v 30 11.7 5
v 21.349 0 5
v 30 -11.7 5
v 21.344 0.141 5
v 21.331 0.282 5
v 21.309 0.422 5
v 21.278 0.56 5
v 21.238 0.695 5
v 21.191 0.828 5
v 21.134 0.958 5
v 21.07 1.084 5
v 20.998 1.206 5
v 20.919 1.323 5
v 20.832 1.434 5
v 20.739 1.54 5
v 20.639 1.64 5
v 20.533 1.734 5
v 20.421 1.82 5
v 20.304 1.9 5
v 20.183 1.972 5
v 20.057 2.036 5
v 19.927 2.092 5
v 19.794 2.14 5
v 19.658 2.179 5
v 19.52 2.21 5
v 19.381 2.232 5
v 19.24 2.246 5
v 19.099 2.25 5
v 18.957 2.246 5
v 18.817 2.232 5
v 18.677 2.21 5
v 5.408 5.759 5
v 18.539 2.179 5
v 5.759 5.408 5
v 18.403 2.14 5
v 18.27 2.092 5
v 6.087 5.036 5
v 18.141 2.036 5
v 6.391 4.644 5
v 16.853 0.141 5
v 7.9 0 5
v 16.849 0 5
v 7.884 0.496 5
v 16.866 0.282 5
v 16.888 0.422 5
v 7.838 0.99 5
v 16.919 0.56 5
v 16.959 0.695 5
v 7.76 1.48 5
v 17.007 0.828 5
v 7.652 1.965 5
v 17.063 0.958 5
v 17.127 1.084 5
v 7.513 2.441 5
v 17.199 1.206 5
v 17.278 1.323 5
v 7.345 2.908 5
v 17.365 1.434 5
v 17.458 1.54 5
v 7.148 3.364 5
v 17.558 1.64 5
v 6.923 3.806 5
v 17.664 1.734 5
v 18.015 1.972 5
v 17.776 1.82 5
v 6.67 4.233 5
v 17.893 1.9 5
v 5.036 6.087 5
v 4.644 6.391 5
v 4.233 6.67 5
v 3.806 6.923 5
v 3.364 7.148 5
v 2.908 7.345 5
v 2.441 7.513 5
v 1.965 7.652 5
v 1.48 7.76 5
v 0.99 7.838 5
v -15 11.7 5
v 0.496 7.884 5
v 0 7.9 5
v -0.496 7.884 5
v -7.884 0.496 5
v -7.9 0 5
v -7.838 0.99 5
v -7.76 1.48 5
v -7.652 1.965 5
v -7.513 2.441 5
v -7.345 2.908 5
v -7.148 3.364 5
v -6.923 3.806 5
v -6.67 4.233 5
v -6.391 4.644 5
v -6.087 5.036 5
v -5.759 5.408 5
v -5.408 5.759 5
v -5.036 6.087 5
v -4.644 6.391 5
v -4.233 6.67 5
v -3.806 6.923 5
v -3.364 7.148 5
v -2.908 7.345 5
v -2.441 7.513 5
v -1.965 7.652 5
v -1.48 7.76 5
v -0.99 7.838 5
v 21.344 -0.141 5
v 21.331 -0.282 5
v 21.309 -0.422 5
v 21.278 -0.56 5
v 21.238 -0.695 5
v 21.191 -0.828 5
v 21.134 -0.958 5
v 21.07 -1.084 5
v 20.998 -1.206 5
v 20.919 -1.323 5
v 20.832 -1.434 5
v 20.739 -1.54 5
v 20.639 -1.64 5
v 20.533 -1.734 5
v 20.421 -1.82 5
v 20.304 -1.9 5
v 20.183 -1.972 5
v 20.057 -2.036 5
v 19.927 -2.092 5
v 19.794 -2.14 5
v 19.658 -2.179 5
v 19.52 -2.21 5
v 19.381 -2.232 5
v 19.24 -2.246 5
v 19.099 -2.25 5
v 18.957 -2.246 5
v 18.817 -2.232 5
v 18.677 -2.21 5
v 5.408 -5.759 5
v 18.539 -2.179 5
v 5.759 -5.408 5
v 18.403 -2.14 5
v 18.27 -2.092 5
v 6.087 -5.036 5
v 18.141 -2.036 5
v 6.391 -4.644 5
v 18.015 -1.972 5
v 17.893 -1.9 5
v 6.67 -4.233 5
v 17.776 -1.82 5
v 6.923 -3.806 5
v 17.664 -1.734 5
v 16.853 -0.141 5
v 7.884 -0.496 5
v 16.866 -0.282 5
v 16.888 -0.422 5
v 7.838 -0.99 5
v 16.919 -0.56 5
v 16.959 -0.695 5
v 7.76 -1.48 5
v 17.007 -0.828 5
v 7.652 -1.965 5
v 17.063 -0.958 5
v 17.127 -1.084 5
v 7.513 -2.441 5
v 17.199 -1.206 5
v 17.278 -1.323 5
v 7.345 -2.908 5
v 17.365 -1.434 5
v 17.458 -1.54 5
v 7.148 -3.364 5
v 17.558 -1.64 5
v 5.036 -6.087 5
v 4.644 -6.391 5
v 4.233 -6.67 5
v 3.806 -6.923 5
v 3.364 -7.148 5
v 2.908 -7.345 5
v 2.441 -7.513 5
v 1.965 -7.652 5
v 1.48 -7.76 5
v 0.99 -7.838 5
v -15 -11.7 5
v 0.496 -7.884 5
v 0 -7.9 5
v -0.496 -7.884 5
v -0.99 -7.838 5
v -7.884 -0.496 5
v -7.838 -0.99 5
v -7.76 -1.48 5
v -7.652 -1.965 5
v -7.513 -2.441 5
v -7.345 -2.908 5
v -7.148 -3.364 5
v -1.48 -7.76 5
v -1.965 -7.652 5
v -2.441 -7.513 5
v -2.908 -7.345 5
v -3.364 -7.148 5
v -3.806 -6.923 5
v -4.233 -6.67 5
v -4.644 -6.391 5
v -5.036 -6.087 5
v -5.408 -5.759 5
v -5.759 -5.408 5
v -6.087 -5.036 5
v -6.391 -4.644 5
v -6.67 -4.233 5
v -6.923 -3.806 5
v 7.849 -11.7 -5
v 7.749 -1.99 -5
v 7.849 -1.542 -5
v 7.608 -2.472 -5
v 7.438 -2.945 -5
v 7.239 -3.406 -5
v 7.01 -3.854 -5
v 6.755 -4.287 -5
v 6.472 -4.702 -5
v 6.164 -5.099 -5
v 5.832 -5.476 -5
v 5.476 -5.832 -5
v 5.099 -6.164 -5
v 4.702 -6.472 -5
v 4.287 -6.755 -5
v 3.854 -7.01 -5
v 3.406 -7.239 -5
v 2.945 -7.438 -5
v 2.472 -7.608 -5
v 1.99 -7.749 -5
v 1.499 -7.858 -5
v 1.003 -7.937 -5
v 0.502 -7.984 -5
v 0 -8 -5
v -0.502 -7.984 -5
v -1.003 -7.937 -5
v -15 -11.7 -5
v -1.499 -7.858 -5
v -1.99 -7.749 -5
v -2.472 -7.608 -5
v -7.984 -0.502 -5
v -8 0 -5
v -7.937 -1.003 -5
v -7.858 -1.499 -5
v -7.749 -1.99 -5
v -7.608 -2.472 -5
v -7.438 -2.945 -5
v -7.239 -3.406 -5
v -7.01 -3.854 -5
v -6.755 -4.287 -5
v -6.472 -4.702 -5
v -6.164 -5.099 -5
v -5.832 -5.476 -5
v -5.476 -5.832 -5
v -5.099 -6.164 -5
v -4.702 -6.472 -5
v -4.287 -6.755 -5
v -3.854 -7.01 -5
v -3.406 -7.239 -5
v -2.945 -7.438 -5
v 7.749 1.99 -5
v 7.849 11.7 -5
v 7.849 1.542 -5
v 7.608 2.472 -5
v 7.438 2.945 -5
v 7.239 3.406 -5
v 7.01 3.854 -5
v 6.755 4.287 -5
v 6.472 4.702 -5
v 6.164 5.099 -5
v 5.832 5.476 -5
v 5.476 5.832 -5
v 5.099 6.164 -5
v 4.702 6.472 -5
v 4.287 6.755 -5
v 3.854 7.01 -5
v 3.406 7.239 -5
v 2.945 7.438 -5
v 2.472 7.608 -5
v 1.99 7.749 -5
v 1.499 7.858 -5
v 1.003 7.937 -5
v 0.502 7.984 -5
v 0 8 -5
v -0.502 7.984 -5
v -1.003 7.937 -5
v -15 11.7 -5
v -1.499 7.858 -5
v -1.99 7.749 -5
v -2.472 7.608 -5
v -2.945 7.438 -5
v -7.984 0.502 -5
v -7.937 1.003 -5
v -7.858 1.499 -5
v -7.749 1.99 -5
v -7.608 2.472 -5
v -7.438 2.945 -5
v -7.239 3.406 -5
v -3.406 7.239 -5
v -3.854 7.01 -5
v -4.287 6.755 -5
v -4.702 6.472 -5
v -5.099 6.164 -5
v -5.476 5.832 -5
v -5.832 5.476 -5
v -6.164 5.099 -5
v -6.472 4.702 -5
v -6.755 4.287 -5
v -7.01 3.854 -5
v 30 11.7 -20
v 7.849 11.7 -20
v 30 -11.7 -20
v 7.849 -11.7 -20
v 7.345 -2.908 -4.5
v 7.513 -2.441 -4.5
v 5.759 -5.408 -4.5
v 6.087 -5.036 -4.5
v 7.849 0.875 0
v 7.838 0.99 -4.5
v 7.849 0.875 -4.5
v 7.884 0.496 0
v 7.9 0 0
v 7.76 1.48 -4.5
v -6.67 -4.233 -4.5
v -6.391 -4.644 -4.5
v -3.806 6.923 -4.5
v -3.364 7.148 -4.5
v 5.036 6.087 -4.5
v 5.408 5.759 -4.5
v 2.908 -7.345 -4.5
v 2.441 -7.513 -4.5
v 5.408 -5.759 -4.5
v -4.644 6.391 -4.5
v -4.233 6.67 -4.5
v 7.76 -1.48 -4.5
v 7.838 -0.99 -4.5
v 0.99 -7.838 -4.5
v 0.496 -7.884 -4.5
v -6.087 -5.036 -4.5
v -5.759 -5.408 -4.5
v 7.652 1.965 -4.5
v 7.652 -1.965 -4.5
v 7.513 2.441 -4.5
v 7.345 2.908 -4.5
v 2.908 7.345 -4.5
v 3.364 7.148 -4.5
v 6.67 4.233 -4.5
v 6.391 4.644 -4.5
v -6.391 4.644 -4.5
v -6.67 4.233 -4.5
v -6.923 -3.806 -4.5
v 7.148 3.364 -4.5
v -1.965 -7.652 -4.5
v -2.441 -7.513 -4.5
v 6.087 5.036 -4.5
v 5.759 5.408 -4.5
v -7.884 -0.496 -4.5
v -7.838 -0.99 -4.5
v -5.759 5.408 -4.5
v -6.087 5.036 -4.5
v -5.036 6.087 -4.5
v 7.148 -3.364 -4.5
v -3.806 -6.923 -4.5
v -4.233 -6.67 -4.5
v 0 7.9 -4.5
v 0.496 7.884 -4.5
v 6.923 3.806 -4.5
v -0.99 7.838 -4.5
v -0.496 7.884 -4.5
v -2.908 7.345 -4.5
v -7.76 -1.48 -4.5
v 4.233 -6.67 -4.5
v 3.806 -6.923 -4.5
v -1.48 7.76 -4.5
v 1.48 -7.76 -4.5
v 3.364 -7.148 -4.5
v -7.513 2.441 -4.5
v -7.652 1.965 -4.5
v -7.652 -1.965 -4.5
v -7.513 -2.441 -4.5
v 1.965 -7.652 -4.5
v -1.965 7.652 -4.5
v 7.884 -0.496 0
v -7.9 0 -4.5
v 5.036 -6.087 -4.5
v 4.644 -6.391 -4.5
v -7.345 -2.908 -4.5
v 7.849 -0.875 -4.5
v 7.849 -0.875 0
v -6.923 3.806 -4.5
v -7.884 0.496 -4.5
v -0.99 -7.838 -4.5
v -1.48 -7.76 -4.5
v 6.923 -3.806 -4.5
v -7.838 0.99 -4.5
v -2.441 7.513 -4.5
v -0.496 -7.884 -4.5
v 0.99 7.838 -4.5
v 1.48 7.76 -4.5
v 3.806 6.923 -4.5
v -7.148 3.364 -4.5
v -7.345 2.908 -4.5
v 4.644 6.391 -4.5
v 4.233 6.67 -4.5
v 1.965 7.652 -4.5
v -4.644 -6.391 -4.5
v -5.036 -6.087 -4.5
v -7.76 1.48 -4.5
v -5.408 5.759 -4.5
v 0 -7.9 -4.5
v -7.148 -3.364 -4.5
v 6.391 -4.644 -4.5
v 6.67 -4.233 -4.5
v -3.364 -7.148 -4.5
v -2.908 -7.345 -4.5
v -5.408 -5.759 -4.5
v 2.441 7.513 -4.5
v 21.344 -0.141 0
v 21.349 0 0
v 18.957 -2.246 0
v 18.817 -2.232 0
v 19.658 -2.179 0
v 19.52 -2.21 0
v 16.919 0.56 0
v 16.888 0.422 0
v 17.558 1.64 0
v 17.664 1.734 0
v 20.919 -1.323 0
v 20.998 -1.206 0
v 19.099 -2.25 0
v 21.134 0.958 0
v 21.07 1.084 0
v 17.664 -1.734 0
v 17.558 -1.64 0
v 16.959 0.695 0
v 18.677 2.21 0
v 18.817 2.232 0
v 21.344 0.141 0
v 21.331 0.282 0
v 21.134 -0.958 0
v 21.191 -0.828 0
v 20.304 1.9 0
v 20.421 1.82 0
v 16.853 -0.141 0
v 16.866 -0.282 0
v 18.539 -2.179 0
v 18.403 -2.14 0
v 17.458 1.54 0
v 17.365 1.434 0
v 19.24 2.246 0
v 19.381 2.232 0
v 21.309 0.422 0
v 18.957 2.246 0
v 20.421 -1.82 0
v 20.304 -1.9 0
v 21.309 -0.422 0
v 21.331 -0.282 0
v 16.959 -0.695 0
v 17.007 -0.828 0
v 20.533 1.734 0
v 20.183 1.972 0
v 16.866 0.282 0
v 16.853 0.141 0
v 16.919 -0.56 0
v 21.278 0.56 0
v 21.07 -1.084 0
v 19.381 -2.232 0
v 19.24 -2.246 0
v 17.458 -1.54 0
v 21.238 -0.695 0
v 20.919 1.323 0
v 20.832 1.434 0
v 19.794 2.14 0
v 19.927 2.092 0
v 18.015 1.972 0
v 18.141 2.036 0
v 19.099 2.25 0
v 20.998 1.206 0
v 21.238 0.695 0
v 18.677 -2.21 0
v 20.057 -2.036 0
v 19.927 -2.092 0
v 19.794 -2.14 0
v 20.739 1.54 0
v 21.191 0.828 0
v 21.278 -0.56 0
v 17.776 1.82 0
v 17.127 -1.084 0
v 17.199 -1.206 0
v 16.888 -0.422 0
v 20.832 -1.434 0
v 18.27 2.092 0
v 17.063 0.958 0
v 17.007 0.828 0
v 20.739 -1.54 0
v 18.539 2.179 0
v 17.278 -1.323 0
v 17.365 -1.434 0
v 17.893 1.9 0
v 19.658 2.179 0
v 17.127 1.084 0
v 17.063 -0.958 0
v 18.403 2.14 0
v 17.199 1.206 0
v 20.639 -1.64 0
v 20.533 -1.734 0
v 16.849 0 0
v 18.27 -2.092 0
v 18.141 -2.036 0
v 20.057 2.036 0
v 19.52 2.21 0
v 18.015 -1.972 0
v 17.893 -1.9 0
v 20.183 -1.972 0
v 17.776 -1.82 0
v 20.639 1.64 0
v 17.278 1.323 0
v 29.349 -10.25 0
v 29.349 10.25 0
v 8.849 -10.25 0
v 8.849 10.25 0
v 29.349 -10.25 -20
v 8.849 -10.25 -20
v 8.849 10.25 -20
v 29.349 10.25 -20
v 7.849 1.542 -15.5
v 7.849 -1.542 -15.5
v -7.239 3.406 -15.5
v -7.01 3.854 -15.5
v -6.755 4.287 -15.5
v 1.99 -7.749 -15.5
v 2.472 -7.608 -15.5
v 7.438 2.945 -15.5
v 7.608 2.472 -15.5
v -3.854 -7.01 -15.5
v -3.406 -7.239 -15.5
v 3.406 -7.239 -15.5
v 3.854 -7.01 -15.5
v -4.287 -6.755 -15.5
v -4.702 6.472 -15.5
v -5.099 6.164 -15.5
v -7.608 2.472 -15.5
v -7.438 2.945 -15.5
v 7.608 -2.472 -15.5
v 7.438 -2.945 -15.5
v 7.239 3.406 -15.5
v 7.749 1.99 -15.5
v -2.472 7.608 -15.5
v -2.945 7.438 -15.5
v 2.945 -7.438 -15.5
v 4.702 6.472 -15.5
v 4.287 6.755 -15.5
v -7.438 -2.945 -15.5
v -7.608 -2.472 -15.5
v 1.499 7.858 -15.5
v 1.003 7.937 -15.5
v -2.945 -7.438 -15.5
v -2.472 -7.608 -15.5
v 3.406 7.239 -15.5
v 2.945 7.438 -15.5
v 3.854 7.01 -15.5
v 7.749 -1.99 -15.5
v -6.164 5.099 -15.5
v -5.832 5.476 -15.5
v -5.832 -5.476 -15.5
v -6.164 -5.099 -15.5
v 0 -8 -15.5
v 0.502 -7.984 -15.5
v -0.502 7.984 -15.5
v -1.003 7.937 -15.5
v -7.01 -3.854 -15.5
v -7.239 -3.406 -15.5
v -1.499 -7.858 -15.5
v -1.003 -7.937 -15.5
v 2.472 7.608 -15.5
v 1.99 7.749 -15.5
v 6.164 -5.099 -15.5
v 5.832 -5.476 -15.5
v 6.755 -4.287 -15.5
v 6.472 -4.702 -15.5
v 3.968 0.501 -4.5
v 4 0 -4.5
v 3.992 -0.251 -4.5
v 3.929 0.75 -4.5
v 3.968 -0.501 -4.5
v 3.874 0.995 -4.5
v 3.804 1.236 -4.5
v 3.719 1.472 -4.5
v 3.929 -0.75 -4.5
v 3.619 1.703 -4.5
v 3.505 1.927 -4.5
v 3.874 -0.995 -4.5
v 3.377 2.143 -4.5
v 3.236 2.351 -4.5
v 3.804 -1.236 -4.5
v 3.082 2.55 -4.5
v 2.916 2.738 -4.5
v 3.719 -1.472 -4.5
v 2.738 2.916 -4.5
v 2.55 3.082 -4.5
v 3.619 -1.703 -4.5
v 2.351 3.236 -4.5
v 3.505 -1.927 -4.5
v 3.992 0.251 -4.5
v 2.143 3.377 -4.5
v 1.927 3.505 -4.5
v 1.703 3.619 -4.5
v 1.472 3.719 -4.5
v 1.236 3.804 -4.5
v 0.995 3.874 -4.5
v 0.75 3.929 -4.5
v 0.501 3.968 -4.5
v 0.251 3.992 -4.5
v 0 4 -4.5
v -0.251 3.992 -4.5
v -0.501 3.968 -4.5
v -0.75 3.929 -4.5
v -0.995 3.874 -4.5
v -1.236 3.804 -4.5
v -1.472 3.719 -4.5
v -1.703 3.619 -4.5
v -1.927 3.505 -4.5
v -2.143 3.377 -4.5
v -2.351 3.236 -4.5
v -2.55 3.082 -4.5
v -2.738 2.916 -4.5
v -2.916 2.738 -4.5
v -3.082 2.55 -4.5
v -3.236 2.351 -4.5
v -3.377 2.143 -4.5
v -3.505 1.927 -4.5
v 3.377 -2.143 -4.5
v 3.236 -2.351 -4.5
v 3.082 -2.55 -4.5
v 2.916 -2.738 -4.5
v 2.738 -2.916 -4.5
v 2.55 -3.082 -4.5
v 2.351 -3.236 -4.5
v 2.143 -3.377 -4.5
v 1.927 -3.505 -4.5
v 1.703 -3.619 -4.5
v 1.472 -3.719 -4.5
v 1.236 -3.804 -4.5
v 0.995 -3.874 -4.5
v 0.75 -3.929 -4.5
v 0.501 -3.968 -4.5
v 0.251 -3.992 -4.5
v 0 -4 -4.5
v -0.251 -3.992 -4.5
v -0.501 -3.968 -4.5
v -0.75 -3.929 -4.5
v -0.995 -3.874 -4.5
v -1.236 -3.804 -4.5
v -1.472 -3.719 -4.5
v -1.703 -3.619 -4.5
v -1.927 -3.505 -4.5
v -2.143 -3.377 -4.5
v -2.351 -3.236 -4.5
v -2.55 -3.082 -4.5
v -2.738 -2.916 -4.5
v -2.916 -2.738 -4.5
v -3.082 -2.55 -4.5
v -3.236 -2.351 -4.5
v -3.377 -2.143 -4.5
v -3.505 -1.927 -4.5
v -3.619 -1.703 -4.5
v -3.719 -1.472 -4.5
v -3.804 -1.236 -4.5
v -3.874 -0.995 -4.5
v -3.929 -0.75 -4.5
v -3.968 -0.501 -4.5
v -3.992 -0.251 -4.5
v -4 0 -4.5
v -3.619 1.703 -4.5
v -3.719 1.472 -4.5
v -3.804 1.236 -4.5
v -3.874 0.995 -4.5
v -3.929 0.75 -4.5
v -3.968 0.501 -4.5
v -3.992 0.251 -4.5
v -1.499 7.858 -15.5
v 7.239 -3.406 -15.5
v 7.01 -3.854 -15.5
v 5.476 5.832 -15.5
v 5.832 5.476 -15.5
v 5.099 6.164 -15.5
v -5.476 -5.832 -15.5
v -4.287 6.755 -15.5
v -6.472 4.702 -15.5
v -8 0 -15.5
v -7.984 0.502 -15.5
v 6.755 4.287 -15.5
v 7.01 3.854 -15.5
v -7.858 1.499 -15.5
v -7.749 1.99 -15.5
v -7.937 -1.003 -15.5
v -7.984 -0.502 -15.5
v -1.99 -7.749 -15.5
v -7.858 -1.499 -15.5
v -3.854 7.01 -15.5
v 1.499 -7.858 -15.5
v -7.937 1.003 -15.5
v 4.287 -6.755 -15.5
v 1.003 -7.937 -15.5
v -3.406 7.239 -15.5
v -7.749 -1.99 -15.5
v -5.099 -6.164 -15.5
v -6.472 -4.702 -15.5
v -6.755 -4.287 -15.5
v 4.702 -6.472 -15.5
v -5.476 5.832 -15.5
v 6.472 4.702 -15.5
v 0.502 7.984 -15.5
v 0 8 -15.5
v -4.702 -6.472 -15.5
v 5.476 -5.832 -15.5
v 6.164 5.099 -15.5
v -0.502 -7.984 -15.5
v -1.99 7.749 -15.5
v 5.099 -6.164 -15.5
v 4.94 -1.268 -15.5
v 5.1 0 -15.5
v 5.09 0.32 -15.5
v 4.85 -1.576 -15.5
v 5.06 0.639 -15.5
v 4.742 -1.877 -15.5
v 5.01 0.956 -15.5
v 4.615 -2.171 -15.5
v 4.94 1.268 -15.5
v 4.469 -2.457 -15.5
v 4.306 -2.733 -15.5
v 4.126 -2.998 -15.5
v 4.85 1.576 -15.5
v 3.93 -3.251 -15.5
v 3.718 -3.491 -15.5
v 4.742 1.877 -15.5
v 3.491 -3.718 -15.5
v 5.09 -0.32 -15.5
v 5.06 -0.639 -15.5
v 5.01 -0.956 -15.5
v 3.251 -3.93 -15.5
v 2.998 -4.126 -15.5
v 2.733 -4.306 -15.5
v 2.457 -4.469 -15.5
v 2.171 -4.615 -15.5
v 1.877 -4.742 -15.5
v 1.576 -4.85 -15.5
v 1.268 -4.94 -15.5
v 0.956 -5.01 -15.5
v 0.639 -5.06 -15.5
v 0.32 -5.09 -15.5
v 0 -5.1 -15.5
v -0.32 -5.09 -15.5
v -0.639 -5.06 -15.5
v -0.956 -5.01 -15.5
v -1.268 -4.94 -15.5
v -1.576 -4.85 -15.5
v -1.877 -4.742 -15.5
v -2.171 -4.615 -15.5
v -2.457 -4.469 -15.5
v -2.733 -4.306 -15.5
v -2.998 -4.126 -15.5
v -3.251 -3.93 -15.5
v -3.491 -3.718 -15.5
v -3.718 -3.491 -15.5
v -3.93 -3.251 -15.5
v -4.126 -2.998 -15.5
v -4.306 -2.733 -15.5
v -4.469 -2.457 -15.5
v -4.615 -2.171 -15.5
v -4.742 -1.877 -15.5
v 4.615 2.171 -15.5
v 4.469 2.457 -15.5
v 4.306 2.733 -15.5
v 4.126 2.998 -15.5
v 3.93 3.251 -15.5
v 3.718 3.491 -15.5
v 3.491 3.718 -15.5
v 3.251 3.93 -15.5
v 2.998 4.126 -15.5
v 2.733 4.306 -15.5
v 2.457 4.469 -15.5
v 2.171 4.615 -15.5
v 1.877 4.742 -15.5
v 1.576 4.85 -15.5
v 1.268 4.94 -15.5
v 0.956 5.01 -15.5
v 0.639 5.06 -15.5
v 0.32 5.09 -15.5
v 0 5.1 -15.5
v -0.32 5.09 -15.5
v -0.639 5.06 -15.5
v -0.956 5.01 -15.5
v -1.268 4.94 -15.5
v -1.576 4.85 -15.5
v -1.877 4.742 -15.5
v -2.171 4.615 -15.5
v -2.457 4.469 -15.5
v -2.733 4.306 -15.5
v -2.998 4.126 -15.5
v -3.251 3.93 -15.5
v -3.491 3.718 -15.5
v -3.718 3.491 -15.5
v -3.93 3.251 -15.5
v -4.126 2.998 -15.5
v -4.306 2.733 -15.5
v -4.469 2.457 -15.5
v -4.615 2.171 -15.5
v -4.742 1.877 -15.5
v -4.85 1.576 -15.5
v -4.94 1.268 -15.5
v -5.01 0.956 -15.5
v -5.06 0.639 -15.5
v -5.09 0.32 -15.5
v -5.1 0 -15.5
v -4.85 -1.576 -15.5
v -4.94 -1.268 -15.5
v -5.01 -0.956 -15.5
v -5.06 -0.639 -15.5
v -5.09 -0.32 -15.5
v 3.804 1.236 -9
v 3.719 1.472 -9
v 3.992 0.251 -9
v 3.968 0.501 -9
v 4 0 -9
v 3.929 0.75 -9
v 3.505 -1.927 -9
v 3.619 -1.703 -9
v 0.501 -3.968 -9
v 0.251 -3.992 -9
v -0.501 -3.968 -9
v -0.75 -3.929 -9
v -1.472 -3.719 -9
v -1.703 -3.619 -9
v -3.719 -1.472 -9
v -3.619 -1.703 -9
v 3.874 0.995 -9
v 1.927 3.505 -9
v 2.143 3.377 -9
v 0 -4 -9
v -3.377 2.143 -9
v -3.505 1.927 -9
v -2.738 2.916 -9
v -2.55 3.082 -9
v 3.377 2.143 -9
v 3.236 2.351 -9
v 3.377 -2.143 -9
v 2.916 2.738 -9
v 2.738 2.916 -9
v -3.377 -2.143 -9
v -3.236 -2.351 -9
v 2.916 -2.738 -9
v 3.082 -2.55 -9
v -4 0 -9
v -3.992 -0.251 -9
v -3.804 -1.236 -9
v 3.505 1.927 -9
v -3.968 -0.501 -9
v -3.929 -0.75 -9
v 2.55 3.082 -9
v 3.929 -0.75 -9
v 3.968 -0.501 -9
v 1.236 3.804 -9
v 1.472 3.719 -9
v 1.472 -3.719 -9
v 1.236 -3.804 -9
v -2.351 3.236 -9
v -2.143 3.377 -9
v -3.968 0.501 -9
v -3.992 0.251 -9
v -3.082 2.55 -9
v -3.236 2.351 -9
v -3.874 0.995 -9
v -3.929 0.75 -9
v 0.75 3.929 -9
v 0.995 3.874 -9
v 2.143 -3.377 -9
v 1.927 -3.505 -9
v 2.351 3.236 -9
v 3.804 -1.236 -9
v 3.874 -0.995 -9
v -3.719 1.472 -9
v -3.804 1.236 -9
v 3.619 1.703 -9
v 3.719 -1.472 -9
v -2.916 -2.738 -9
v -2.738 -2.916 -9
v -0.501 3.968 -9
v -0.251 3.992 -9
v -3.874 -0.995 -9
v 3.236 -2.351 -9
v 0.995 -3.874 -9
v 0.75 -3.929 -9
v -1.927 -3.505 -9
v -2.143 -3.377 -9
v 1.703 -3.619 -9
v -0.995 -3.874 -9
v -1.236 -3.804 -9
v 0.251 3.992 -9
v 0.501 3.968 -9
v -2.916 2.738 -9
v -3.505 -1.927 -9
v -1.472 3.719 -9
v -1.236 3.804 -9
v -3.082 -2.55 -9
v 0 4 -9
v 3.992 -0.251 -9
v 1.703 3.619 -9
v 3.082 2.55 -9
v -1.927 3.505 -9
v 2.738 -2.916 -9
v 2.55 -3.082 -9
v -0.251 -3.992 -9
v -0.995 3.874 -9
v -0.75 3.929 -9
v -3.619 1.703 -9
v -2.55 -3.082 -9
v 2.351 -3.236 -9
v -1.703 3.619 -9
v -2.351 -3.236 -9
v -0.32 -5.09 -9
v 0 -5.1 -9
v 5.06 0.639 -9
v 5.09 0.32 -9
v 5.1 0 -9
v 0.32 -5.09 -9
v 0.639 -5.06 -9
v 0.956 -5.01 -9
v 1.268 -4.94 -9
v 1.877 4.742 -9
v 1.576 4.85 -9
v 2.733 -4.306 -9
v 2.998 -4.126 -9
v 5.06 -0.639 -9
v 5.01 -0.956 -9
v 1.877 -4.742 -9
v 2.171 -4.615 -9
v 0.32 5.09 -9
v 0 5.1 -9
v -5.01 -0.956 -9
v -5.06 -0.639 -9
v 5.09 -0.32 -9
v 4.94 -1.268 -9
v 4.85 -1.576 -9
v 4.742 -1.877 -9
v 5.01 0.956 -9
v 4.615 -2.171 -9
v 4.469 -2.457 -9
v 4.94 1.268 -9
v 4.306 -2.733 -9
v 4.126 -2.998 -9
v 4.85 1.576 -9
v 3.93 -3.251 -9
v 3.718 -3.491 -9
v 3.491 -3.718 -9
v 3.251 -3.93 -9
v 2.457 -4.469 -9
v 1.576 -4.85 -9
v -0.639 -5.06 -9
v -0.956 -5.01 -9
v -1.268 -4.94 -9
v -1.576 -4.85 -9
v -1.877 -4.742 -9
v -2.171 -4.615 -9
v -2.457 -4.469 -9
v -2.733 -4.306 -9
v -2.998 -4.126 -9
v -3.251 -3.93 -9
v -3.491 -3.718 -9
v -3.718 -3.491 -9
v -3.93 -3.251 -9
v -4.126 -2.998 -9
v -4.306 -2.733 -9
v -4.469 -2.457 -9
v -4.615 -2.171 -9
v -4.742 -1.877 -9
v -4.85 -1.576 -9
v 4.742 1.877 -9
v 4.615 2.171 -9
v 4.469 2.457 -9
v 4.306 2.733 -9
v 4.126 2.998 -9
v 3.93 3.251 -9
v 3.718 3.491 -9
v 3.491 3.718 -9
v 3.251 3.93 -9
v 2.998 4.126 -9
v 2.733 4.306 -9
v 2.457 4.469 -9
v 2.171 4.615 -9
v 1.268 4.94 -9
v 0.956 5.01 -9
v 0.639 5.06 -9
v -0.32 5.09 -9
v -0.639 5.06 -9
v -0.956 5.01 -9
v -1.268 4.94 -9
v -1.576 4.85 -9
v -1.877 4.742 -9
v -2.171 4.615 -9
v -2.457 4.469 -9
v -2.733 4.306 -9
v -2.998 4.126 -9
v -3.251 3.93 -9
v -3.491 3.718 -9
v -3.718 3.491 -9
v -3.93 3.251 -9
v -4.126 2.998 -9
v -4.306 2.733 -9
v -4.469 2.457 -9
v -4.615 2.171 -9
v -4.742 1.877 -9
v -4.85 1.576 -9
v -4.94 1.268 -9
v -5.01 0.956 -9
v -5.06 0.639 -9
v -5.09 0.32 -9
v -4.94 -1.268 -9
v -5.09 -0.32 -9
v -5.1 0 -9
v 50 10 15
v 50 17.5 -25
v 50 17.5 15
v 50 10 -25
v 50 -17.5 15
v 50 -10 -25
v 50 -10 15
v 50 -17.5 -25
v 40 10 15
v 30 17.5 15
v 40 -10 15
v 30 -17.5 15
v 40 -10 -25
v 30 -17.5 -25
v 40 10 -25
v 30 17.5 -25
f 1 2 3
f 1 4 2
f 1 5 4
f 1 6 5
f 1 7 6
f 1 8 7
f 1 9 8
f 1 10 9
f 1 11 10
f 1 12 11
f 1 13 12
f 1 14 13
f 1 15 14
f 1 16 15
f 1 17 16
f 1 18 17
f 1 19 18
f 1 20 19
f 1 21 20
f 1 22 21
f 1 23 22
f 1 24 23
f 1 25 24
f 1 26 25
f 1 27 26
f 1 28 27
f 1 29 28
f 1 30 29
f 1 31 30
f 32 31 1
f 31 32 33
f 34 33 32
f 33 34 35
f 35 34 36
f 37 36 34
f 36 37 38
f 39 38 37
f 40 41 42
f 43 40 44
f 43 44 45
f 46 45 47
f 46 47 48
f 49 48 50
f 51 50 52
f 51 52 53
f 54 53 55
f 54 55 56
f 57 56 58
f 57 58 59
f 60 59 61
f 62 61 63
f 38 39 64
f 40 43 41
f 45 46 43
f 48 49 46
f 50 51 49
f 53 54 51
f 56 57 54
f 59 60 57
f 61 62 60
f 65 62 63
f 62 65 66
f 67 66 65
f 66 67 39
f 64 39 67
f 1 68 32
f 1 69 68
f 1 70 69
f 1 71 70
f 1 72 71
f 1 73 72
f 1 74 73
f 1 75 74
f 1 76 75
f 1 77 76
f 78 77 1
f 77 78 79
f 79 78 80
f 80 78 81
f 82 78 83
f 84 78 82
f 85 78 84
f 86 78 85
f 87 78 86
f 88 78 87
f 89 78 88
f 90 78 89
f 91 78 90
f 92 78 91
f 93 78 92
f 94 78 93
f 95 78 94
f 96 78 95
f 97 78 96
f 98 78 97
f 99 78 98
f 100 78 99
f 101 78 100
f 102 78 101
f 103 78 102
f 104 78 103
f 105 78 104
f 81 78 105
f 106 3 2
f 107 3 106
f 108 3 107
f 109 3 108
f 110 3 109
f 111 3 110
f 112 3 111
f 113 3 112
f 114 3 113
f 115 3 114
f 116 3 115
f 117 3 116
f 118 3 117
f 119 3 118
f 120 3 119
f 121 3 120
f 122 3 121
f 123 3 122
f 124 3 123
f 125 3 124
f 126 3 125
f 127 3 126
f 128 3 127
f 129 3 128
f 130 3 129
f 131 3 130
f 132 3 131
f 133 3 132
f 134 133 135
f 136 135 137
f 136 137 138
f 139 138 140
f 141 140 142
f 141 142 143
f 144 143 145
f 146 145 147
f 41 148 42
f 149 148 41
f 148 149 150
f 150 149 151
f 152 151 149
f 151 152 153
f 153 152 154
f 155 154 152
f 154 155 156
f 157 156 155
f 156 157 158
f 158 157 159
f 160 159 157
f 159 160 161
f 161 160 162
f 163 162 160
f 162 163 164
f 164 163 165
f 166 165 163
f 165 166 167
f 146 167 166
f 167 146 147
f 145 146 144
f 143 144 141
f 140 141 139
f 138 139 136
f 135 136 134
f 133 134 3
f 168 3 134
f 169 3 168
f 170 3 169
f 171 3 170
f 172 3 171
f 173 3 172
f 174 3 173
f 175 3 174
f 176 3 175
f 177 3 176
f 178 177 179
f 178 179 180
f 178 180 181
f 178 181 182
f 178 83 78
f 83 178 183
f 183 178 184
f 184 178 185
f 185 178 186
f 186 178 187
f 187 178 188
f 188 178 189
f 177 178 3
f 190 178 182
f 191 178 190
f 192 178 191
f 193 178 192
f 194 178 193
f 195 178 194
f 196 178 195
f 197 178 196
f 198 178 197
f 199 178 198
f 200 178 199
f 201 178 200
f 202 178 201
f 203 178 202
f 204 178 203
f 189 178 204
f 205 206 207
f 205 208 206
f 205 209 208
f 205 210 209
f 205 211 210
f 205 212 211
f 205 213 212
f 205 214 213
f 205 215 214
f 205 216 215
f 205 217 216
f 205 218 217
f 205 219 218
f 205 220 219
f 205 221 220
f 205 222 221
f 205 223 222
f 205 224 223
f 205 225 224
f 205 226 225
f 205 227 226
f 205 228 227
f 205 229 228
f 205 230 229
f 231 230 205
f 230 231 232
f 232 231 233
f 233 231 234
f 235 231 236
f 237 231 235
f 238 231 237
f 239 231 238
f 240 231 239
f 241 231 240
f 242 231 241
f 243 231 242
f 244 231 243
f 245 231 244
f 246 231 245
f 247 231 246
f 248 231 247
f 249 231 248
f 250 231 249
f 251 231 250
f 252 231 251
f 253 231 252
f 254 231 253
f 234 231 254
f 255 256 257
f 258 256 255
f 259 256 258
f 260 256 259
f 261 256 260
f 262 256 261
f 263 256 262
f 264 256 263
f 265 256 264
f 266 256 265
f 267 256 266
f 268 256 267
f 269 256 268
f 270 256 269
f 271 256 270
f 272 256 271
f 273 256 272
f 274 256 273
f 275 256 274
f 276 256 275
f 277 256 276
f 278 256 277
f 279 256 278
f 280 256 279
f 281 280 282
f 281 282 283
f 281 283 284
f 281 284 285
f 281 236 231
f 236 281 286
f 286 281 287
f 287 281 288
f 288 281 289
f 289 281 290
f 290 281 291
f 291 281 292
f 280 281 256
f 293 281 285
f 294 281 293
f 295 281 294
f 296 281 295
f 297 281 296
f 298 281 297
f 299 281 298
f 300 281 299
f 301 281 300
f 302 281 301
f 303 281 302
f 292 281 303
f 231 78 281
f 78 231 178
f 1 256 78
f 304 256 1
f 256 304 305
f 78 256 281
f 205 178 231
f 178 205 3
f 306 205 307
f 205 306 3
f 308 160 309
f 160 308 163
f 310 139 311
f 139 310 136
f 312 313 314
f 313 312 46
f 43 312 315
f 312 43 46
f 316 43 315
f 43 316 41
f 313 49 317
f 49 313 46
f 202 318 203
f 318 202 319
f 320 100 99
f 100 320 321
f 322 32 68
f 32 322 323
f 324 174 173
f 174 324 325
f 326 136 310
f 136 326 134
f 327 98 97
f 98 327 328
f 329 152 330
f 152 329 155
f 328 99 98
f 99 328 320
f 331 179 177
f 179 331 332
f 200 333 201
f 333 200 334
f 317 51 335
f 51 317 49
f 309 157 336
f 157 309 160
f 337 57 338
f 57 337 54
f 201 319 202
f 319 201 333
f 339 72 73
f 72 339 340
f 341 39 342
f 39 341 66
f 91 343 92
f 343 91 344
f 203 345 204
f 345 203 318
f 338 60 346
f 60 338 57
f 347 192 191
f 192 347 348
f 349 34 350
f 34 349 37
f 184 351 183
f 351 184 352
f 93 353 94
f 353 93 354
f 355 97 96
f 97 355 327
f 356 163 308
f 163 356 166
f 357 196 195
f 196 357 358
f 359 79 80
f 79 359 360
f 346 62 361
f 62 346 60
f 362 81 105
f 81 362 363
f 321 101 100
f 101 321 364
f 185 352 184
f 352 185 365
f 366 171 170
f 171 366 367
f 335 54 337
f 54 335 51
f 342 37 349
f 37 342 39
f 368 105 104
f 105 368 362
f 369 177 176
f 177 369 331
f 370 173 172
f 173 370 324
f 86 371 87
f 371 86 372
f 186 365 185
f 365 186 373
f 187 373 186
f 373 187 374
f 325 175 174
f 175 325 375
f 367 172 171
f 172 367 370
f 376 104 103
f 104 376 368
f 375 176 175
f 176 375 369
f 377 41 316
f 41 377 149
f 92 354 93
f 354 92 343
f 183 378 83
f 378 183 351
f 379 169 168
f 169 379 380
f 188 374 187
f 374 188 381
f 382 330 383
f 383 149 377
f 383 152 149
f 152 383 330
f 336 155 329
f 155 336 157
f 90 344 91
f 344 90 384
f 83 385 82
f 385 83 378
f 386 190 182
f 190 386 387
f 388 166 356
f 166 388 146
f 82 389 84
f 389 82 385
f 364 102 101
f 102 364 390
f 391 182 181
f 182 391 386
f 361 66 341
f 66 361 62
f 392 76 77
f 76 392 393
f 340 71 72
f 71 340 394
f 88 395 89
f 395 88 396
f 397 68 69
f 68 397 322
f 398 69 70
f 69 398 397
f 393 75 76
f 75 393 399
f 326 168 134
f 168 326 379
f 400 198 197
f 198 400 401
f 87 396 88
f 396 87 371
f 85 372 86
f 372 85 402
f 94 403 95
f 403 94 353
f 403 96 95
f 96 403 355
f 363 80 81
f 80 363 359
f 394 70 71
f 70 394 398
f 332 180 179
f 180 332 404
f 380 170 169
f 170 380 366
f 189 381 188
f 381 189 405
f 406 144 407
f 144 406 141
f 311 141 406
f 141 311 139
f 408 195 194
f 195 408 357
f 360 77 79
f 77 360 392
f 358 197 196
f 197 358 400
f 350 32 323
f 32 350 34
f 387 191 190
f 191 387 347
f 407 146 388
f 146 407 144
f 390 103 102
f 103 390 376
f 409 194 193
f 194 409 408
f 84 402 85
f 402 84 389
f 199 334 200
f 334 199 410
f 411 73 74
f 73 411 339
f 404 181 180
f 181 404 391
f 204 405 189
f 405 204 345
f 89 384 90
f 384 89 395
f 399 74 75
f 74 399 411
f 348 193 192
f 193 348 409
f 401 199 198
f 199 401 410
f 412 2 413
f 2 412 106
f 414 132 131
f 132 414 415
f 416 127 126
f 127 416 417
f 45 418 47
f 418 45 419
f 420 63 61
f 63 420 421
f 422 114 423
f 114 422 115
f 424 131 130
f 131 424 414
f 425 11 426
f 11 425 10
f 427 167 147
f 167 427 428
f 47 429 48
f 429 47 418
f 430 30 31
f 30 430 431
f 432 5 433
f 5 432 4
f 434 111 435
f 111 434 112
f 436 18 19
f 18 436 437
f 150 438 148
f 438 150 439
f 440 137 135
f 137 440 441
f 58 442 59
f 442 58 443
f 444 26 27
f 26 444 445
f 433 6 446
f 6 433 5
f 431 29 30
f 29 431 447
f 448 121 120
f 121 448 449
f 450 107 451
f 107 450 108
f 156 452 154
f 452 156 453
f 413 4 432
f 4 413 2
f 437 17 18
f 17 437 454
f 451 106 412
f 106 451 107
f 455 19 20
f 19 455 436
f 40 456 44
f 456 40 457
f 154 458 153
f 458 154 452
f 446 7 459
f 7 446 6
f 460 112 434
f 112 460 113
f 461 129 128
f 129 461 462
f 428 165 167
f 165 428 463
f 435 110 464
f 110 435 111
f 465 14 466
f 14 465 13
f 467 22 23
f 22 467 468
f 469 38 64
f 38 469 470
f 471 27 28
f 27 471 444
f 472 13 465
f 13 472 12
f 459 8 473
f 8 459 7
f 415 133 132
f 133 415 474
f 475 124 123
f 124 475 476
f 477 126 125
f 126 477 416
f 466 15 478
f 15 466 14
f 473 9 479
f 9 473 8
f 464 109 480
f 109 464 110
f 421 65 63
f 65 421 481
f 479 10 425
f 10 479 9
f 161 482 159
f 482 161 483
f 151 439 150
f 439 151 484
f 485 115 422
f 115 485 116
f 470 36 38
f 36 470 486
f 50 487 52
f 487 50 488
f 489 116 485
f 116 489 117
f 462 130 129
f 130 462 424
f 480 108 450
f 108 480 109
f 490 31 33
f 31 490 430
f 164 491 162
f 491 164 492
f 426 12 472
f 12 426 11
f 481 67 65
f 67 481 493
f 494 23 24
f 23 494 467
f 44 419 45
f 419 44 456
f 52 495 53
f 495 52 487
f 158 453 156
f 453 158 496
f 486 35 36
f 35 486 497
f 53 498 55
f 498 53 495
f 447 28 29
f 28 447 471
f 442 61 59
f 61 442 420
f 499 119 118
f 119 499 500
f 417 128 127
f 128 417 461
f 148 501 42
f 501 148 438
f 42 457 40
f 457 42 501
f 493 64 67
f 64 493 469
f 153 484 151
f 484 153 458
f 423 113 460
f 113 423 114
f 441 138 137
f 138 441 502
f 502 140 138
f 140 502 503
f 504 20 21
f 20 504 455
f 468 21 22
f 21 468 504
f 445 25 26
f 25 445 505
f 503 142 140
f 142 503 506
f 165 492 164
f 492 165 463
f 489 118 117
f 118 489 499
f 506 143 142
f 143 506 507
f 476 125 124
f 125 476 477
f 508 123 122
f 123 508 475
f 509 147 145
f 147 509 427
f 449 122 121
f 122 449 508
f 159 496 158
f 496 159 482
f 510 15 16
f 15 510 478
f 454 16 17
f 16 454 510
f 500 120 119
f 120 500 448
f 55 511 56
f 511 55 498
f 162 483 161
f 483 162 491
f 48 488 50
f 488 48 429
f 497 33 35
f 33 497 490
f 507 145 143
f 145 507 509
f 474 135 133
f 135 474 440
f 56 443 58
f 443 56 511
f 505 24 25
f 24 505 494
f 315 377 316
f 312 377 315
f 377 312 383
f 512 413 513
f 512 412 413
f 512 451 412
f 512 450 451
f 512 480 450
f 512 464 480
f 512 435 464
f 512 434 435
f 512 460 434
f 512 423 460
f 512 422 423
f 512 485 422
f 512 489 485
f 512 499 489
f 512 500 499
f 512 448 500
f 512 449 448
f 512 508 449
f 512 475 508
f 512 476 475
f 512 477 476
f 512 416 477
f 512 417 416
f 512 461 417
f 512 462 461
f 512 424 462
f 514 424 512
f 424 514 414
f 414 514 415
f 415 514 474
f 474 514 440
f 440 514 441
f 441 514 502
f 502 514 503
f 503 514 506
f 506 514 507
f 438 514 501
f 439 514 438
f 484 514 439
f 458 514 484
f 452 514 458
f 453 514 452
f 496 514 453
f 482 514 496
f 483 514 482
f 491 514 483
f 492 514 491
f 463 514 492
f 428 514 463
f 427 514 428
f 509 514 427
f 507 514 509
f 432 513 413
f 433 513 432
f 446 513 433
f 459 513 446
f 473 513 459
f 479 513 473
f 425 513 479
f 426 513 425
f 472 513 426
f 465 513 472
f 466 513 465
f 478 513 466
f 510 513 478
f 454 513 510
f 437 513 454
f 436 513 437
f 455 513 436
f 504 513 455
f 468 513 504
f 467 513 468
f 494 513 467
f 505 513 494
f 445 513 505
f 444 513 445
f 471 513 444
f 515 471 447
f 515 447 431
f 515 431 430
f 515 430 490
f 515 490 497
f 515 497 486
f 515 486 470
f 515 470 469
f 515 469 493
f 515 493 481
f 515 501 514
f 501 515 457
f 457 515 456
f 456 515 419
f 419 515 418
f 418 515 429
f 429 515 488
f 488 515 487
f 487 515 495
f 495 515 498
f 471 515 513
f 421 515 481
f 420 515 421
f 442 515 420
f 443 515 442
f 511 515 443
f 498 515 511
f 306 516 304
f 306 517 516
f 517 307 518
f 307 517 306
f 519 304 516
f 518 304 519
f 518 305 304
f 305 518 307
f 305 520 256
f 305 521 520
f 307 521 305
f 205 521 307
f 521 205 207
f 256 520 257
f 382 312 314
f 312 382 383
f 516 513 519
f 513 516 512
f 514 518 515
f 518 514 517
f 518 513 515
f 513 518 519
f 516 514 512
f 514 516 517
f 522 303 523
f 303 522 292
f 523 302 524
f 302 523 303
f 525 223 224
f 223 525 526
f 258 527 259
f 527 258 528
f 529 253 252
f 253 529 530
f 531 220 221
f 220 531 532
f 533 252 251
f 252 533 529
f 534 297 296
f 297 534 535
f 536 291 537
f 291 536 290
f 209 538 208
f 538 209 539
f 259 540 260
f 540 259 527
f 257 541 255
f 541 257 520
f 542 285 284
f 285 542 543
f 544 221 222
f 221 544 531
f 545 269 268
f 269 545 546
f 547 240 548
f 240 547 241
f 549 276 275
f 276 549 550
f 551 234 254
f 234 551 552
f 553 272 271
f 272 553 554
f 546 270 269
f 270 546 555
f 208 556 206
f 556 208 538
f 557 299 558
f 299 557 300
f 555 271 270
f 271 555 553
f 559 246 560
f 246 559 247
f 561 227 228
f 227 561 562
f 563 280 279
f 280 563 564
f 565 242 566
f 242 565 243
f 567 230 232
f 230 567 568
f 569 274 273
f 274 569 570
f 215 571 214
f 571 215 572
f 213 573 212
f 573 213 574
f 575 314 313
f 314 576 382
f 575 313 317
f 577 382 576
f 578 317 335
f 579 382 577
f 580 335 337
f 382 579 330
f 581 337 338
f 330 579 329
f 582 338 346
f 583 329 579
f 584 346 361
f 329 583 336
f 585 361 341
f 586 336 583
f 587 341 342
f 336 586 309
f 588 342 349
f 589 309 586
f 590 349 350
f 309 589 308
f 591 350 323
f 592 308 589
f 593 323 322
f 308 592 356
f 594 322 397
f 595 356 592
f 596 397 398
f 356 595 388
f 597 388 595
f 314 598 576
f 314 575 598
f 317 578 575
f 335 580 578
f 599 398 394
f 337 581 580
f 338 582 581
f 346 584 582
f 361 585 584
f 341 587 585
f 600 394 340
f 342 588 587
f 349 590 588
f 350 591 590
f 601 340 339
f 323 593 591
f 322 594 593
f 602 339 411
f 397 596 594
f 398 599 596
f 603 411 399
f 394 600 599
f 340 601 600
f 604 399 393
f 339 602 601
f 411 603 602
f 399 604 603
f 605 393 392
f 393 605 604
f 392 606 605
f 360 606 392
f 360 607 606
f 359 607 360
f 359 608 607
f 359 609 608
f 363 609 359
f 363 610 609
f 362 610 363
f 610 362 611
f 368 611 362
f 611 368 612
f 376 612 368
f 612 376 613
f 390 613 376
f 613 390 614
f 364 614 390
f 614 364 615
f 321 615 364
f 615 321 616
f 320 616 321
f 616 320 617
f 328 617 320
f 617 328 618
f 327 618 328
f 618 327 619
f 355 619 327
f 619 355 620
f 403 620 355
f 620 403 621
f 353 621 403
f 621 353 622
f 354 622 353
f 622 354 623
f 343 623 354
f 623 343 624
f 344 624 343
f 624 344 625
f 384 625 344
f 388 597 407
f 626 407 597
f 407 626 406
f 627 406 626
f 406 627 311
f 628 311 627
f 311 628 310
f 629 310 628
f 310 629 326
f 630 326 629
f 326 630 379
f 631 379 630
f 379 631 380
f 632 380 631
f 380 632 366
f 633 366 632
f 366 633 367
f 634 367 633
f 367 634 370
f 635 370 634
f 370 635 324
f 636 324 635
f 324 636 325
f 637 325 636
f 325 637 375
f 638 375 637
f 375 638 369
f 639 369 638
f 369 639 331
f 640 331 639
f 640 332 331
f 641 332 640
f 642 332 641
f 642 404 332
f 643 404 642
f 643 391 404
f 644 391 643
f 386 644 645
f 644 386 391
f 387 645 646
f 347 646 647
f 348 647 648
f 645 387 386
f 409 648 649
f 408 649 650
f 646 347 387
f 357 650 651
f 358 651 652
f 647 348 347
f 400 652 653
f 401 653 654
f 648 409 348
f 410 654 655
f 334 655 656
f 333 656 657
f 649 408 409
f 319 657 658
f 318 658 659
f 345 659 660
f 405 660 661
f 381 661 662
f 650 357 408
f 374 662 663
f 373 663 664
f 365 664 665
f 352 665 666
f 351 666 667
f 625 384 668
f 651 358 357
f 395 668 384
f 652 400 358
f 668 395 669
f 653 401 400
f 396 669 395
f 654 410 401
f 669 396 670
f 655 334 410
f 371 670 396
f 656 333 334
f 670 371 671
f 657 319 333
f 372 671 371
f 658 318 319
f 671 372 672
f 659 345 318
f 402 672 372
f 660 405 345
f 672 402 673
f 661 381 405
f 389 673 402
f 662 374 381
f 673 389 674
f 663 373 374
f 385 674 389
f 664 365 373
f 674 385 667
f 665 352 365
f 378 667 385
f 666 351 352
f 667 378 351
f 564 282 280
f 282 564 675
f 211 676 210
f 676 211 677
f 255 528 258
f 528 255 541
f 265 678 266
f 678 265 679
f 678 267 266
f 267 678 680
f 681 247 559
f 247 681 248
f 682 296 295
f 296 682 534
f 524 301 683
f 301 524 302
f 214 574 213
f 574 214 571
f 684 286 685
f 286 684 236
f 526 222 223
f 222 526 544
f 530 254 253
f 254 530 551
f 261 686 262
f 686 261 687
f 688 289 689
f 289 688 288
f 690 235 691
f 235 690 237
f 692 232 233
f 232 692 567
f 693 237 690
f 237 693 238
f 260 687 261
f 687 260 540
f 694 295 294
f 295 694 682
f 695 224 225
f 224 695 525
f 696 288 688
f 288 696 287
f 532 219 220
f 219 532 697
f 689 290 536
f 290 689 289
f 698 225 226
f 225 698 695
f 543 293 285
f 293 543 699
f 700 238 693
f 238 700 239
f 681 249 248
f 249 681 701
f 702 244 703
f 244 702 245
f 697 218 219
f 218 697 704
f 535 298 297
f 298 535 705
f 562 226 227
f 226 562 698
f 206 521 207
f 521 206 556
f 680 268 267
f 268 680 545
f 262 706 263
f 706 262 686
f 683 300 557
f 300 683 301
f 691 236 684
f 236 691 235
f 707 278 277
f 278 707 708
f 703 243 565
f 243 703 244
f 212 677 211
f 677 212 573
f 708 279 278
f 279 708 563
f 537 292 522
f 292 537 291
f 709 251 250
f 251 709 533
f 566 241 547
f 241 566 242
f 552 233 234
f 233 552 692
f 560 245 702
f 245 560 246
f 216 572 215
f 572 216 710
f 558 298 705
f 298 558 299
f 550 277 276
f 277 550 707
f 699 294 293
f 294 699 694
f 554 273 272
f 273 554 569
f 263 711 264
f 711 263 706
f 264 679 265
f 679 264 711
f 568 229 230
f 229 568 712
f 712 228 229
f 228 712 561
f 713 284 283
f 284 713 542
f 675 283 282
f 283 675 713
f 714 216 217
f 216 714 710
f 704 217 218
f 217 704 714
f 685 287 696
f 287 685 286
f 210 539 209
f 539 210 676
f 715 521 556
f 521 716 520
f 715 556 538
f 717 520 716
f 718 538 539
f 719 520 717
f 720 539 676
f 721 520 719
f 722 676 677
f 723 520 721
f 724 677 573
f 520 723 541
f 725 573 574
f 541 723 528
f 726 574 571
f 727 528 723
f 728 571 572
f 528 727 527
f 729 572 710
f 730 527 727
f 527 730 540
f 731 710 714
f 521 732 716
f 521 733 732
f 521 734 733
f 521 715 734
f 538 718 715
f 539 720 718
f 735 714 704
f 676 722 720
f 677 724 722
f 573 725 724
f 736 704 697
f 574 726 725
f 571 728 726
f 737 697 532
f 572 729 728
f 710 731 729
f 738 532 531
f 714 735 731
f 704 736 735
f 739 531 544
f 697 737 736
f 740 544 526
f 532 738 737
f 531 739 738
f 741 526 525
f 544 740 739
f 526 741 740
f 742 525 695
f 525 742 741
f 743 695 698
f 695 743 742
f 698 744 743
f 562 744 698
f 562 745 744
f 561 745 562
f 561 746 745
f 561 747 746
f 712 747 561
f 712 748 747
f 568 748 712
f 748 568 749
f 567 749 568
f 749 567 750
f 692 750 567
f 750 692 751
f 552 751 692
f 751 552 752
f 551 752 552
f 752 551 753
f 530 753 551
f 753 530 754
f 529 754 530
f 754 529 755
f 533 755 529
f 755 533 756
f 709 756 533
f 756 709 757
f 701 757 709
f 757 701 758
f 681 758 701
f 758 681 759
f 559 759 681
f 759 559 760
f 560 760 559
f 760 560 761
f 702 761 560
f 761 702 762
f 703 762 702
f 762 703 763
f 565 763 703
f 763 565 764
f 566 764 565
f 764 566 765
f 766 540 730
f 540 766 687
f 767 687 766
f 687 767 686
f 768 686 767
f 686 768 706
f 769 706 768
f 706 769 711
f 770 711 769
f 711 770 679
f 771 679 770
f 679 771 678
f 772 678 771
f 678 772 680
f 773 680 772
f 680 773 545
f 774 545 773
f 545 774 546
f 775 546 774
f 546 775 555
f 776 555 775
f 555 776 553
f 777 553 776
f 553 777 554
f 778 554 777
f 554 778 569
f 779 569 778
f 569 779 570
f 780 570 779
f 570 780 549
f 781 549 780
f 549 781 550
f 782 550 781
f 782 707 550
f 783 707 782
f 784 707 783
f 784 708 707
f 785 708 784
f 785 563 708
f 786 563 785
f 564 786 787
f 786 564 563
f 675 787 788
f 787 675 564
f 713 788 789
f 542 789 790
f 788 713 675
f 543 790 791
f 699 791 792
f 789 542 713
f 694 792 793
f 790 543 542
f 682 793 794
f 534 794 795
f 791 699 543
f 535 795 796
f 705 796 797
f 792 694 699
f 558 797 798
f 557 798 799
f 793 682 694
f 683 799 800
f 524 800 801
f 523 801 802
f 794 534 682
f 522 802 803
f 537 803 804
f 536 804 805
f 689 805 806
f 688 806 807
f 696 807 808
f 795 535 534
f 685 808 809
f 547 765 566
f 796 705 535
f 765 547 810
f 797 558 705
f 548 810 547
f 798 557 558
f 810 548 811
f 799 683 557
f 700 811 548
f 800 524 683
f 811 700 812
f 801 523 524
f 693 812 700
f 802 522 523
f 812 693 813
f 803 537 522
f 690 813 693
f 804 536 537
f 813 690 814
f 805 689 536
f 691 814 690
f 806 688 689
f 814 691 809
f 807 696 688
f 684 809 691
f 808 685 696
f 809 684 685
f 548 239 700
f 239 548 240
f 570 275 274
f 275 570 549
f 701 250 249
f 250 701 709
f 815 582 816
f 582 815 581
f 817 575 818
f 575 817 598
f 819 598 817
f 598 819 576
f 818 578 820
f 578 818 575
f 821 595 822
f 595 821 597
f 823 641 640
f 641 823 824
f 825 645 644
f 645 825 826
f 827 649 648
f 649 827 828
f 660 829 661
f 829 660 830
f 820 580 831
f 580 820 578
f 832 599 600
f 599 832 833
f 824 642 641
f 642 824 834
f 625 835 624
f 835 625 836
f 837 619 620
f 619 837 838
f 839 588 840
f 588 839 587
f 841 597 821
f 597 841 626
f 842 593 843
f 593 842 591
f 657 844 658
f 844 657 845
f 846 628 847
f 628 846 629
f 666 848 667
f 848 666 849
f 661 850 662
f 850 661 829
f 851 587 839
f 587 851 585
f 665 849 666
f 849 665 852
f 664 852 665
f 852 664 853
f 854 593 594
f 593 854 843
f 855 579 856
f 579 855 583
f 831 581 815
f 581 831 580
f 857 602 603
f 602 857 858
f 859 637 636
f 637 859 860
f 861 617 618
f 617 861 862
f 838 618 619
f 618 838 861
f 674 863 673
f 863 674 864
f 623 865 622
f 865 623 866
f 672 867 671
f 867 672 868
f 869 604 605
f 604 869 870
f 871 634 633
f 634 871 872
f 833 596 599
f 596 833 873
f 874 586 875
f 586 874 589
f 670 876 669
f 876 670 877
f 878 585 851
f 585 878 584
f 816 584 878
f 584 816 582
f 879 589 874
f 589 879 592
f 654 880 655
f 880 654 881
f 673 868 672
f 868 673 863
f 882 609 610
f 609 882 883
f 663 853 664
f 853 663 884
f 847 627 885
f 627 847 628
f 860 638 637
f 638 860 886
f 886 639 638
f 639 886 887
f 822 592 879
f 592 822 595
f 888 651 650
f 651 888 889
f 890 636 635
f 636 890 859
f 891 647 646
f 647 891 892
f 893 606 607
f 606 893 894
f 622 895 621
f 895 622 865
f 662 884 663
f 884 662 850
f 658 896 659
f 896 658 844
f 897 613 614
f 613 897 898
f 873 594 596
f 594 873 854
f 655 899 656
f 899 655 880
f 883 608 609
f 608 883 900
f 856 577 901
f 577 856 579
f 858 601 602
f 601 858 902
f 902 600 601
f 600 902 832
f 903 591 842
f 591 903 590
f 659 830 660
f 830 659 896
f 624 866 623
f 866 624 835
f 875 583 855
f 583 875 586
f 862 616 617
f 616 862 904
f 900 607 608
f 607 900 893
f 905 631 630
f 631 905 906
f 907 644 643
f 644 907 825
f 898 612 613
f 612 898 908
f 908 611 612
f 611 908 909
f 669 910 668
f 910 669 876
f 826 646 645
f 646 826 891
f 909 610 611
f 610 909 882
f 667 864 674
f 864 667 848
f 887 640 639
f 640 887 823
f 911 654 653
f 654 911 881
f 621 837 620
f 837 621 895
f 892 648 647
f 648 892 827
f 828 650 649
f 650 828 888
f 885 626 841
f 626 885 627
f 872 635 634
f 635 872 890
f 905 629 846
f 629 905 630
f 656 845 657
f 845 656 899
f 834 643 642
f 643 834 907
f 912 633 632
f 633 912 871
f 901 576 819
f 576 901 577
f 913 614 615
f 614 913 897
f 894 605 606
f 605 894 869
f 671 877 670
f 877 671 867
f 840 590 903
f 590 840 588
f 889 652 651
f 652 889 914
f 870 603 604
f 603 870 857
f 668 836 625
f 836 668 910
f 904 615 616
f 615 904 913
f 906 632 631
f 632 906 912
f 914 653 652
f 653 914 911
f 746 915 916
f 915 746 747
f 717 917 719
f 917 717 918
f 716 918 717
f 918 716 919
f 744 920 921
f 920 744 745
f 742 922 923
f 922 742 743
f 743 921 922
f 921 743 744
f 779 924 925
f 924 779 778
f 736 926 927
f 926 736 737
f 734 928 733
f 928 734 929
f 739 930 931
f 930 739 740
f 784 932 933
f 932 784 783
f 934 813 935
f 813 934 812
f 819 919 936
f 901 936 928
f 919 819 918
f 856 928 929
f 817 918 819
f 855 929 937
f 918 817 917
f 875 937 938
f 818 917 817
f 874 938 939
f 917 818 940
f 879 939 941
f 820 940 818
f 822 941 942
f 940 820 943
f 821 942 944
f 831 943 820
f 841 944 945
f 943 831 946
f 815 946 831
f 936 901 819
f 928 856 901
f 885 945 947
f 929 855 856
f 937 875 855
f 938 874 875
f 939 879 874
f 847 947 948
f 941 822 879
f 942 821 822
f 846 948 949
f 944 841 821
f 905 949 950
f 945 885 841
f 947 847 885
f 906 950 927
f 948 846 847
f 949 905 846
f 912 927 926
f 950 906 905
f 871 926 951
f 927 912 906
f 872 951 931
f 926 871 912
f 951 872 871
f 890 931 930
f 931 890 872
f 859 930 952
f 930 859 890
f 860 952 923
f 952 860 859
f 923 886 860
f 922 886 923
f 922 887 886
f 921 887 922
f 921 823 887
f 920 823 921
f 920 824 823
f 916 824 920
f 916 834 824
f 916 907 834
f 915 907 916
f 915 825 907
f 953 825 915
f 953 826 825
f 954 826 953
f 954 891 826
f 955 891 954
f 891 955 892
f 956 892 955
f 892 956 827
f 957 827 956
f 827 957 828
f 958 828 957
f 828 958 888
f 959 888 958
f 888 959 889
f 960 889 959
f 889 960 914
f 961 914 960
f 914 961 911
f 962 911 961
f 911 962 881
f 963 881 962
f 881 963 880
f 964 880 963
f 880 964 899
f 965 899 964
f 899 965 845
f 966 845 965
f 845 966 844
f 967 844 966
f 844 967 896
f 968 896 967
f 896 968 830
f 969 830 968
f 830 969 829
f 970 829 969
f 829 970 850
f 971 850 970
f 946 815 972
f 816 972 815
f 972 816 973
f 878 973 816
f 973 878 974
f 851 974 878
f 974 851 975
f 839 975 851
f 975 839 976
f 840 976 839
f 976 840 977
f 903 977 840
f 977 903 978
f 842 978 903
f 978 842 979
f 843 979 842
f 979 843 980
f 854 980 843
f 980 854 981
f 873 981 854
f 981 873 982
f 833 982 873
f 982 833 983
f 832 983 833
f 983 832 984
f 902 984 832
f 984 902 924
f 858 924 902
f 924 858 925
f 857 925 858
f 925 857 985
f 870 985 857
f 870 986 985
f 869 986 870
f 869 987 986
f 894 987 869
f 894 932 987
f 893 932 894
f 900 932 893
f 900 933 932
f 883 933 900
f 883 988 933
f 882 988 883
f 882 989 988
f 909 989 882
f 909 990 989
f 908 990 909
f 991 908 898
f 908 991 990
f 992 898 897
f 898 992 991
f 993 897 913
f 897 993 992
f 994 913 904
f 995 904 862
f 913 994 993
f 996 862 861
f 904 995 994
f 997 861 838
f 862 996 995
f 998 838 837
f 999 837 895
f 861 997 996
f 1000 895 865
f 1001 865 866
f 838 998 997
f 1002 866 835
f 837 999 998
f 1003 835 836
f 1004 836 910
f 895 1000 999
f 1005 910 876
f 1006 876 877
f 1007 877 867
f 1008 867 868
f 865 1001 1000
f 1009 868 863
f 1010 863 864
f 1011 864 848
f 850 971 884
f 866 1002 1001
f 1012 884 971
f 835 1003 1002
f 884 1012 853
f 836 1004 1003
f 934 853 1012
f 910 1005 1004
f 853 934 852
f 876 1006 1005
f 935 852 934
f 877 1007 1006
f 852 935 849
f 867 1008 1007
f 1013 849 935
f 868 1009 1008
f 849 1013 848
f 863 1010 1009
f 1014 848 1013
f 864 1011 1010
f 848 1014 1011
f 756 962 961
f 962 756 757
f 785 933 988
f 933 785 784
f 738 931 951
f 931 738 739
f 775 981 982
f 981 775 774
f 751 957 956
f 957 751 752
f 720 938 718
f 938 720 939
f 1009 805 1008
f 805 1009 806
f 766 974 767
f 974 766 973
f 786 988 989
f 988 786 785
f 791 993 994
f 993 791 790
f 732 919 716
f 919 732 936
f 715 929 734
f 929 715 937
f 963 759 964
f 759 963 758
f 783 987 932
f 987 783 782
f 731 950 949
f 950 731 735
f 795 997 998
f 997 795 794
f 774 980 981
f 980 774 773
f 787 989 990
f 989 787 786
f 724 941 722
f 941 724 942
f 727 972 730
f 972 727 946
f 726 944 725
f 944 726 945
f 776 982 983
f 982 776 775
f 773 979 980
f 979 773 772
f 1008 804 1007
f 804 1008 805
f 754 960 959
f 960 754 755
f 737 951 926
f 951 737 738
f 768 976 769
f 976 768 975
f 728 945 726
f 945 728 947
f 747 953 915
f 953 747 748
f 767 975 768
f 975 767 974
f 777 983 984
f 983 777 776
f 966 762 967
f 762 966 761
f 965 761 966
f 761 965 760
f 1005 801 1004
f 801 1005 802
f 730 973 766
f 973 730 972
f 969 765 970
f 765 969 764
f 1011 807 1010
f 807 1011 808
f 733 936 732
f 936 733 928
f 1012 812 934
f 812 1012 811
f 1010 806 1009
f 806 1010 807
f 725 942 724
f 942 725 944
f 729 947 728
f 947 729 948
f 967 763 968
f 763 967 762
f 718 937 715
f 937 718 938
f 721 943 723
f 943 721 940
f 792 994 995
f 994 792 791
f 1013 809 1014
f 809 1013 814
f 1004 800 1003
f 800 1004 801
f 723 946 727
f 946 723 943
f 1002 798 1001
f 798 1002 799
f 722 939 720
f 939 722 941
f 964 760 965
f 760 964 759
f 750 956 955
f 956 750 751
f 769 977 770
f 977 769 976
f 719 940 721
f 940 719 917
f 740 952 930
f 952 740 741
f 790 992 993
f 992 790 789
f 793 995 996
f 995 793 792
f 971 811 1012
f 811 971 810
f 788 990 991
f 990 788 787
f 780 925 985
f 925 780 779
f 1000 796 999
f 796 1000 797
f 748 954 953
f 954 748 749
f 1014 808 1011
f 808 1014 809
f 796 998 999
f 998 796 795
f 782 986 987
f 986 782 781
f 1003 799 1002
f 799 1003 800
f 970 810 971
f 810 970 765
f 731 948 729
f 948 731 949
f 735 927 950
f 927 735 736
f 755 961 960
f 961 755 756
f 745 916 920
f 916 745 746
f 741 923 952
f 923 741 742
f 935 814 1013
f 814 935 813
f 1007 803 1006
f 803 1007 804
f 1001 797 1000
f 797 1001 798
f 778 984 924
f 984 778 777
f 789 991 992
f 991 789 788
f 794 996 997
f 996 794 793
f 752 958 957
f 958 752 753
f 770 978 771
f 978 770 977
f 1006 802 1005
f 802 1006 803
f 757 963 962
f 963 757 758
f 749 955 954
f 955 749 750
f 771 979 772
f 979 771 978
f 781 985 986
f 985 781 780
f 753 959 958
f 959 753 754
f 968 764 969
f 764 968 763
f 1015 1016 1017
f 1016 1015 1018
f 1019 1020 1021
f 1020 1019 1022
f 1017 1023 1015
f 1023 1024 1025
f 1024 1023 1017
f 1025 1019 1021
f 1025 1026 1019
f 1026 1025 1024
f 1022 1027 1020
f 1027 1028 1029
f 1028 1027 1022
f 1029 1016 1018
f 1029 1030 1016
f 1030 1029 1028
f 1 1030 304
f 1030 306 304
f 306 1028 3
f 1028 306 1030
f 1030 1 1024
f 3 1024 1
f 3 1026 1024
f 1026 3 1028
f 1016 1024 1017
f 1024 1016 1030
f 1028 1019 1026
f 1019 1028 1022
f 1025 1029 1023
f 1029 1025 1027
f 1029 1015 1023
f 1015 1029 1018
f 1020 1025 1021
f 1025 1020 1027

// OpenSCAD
include <gears.scad>

distCage = 30;
dVarillaCage = 6;
dExt = 12;
dPol = 25.4/2;

m = 2;
zG = 40;
zC = 20;

rG = m * zG / ( 2* PI);
rC = m * zC / (2 * PI);

$fn = 100;


//Soporte
union() {
    difference(){
        union(){
            difference(){
                translate([10,0,0]){
                    cube([50, distCage-dVarillaCage*1.1, 10],center=true);
                }
                
                //Agujero del soporte
                cylinder(d=dPol+3.1,h=20,center=true);
                
                translate([rG+rC,0,0]){
                    cylinder(d=4.5,h=50,center=true);
                }
            }
            
            //Soporte del motor
            translate([rG+rC,0,-10]){
                difference(){
                    cube([22.5,distCage-dVarillaCage*1.1,20],center=true);
                }
            }
        }
        //Agujero del motor
        translate([rG+rC,0,-20]){
            cube([20.5,20.5,40],center=true);
        }
    }
    
    //Soporte del fotodiodo
    translate([0,0,-10]){
        difference(){
            cylinder(d=dPol+3.3,h=11,center=true);
            cylinder(d=8,h=12,center=true);
            translate([0,0,-5]){
                cylinder(d=10.2,h=12,center=true);
            }
        }
    }
    
    
    translate([50-10,0,-5]){
        difference(){
            cube([20,35,40],center=true);
            hRiel = 6;
            translate([5,0,0]){
                cube([10,20,40],center=true);
            }
        }
    }
}
